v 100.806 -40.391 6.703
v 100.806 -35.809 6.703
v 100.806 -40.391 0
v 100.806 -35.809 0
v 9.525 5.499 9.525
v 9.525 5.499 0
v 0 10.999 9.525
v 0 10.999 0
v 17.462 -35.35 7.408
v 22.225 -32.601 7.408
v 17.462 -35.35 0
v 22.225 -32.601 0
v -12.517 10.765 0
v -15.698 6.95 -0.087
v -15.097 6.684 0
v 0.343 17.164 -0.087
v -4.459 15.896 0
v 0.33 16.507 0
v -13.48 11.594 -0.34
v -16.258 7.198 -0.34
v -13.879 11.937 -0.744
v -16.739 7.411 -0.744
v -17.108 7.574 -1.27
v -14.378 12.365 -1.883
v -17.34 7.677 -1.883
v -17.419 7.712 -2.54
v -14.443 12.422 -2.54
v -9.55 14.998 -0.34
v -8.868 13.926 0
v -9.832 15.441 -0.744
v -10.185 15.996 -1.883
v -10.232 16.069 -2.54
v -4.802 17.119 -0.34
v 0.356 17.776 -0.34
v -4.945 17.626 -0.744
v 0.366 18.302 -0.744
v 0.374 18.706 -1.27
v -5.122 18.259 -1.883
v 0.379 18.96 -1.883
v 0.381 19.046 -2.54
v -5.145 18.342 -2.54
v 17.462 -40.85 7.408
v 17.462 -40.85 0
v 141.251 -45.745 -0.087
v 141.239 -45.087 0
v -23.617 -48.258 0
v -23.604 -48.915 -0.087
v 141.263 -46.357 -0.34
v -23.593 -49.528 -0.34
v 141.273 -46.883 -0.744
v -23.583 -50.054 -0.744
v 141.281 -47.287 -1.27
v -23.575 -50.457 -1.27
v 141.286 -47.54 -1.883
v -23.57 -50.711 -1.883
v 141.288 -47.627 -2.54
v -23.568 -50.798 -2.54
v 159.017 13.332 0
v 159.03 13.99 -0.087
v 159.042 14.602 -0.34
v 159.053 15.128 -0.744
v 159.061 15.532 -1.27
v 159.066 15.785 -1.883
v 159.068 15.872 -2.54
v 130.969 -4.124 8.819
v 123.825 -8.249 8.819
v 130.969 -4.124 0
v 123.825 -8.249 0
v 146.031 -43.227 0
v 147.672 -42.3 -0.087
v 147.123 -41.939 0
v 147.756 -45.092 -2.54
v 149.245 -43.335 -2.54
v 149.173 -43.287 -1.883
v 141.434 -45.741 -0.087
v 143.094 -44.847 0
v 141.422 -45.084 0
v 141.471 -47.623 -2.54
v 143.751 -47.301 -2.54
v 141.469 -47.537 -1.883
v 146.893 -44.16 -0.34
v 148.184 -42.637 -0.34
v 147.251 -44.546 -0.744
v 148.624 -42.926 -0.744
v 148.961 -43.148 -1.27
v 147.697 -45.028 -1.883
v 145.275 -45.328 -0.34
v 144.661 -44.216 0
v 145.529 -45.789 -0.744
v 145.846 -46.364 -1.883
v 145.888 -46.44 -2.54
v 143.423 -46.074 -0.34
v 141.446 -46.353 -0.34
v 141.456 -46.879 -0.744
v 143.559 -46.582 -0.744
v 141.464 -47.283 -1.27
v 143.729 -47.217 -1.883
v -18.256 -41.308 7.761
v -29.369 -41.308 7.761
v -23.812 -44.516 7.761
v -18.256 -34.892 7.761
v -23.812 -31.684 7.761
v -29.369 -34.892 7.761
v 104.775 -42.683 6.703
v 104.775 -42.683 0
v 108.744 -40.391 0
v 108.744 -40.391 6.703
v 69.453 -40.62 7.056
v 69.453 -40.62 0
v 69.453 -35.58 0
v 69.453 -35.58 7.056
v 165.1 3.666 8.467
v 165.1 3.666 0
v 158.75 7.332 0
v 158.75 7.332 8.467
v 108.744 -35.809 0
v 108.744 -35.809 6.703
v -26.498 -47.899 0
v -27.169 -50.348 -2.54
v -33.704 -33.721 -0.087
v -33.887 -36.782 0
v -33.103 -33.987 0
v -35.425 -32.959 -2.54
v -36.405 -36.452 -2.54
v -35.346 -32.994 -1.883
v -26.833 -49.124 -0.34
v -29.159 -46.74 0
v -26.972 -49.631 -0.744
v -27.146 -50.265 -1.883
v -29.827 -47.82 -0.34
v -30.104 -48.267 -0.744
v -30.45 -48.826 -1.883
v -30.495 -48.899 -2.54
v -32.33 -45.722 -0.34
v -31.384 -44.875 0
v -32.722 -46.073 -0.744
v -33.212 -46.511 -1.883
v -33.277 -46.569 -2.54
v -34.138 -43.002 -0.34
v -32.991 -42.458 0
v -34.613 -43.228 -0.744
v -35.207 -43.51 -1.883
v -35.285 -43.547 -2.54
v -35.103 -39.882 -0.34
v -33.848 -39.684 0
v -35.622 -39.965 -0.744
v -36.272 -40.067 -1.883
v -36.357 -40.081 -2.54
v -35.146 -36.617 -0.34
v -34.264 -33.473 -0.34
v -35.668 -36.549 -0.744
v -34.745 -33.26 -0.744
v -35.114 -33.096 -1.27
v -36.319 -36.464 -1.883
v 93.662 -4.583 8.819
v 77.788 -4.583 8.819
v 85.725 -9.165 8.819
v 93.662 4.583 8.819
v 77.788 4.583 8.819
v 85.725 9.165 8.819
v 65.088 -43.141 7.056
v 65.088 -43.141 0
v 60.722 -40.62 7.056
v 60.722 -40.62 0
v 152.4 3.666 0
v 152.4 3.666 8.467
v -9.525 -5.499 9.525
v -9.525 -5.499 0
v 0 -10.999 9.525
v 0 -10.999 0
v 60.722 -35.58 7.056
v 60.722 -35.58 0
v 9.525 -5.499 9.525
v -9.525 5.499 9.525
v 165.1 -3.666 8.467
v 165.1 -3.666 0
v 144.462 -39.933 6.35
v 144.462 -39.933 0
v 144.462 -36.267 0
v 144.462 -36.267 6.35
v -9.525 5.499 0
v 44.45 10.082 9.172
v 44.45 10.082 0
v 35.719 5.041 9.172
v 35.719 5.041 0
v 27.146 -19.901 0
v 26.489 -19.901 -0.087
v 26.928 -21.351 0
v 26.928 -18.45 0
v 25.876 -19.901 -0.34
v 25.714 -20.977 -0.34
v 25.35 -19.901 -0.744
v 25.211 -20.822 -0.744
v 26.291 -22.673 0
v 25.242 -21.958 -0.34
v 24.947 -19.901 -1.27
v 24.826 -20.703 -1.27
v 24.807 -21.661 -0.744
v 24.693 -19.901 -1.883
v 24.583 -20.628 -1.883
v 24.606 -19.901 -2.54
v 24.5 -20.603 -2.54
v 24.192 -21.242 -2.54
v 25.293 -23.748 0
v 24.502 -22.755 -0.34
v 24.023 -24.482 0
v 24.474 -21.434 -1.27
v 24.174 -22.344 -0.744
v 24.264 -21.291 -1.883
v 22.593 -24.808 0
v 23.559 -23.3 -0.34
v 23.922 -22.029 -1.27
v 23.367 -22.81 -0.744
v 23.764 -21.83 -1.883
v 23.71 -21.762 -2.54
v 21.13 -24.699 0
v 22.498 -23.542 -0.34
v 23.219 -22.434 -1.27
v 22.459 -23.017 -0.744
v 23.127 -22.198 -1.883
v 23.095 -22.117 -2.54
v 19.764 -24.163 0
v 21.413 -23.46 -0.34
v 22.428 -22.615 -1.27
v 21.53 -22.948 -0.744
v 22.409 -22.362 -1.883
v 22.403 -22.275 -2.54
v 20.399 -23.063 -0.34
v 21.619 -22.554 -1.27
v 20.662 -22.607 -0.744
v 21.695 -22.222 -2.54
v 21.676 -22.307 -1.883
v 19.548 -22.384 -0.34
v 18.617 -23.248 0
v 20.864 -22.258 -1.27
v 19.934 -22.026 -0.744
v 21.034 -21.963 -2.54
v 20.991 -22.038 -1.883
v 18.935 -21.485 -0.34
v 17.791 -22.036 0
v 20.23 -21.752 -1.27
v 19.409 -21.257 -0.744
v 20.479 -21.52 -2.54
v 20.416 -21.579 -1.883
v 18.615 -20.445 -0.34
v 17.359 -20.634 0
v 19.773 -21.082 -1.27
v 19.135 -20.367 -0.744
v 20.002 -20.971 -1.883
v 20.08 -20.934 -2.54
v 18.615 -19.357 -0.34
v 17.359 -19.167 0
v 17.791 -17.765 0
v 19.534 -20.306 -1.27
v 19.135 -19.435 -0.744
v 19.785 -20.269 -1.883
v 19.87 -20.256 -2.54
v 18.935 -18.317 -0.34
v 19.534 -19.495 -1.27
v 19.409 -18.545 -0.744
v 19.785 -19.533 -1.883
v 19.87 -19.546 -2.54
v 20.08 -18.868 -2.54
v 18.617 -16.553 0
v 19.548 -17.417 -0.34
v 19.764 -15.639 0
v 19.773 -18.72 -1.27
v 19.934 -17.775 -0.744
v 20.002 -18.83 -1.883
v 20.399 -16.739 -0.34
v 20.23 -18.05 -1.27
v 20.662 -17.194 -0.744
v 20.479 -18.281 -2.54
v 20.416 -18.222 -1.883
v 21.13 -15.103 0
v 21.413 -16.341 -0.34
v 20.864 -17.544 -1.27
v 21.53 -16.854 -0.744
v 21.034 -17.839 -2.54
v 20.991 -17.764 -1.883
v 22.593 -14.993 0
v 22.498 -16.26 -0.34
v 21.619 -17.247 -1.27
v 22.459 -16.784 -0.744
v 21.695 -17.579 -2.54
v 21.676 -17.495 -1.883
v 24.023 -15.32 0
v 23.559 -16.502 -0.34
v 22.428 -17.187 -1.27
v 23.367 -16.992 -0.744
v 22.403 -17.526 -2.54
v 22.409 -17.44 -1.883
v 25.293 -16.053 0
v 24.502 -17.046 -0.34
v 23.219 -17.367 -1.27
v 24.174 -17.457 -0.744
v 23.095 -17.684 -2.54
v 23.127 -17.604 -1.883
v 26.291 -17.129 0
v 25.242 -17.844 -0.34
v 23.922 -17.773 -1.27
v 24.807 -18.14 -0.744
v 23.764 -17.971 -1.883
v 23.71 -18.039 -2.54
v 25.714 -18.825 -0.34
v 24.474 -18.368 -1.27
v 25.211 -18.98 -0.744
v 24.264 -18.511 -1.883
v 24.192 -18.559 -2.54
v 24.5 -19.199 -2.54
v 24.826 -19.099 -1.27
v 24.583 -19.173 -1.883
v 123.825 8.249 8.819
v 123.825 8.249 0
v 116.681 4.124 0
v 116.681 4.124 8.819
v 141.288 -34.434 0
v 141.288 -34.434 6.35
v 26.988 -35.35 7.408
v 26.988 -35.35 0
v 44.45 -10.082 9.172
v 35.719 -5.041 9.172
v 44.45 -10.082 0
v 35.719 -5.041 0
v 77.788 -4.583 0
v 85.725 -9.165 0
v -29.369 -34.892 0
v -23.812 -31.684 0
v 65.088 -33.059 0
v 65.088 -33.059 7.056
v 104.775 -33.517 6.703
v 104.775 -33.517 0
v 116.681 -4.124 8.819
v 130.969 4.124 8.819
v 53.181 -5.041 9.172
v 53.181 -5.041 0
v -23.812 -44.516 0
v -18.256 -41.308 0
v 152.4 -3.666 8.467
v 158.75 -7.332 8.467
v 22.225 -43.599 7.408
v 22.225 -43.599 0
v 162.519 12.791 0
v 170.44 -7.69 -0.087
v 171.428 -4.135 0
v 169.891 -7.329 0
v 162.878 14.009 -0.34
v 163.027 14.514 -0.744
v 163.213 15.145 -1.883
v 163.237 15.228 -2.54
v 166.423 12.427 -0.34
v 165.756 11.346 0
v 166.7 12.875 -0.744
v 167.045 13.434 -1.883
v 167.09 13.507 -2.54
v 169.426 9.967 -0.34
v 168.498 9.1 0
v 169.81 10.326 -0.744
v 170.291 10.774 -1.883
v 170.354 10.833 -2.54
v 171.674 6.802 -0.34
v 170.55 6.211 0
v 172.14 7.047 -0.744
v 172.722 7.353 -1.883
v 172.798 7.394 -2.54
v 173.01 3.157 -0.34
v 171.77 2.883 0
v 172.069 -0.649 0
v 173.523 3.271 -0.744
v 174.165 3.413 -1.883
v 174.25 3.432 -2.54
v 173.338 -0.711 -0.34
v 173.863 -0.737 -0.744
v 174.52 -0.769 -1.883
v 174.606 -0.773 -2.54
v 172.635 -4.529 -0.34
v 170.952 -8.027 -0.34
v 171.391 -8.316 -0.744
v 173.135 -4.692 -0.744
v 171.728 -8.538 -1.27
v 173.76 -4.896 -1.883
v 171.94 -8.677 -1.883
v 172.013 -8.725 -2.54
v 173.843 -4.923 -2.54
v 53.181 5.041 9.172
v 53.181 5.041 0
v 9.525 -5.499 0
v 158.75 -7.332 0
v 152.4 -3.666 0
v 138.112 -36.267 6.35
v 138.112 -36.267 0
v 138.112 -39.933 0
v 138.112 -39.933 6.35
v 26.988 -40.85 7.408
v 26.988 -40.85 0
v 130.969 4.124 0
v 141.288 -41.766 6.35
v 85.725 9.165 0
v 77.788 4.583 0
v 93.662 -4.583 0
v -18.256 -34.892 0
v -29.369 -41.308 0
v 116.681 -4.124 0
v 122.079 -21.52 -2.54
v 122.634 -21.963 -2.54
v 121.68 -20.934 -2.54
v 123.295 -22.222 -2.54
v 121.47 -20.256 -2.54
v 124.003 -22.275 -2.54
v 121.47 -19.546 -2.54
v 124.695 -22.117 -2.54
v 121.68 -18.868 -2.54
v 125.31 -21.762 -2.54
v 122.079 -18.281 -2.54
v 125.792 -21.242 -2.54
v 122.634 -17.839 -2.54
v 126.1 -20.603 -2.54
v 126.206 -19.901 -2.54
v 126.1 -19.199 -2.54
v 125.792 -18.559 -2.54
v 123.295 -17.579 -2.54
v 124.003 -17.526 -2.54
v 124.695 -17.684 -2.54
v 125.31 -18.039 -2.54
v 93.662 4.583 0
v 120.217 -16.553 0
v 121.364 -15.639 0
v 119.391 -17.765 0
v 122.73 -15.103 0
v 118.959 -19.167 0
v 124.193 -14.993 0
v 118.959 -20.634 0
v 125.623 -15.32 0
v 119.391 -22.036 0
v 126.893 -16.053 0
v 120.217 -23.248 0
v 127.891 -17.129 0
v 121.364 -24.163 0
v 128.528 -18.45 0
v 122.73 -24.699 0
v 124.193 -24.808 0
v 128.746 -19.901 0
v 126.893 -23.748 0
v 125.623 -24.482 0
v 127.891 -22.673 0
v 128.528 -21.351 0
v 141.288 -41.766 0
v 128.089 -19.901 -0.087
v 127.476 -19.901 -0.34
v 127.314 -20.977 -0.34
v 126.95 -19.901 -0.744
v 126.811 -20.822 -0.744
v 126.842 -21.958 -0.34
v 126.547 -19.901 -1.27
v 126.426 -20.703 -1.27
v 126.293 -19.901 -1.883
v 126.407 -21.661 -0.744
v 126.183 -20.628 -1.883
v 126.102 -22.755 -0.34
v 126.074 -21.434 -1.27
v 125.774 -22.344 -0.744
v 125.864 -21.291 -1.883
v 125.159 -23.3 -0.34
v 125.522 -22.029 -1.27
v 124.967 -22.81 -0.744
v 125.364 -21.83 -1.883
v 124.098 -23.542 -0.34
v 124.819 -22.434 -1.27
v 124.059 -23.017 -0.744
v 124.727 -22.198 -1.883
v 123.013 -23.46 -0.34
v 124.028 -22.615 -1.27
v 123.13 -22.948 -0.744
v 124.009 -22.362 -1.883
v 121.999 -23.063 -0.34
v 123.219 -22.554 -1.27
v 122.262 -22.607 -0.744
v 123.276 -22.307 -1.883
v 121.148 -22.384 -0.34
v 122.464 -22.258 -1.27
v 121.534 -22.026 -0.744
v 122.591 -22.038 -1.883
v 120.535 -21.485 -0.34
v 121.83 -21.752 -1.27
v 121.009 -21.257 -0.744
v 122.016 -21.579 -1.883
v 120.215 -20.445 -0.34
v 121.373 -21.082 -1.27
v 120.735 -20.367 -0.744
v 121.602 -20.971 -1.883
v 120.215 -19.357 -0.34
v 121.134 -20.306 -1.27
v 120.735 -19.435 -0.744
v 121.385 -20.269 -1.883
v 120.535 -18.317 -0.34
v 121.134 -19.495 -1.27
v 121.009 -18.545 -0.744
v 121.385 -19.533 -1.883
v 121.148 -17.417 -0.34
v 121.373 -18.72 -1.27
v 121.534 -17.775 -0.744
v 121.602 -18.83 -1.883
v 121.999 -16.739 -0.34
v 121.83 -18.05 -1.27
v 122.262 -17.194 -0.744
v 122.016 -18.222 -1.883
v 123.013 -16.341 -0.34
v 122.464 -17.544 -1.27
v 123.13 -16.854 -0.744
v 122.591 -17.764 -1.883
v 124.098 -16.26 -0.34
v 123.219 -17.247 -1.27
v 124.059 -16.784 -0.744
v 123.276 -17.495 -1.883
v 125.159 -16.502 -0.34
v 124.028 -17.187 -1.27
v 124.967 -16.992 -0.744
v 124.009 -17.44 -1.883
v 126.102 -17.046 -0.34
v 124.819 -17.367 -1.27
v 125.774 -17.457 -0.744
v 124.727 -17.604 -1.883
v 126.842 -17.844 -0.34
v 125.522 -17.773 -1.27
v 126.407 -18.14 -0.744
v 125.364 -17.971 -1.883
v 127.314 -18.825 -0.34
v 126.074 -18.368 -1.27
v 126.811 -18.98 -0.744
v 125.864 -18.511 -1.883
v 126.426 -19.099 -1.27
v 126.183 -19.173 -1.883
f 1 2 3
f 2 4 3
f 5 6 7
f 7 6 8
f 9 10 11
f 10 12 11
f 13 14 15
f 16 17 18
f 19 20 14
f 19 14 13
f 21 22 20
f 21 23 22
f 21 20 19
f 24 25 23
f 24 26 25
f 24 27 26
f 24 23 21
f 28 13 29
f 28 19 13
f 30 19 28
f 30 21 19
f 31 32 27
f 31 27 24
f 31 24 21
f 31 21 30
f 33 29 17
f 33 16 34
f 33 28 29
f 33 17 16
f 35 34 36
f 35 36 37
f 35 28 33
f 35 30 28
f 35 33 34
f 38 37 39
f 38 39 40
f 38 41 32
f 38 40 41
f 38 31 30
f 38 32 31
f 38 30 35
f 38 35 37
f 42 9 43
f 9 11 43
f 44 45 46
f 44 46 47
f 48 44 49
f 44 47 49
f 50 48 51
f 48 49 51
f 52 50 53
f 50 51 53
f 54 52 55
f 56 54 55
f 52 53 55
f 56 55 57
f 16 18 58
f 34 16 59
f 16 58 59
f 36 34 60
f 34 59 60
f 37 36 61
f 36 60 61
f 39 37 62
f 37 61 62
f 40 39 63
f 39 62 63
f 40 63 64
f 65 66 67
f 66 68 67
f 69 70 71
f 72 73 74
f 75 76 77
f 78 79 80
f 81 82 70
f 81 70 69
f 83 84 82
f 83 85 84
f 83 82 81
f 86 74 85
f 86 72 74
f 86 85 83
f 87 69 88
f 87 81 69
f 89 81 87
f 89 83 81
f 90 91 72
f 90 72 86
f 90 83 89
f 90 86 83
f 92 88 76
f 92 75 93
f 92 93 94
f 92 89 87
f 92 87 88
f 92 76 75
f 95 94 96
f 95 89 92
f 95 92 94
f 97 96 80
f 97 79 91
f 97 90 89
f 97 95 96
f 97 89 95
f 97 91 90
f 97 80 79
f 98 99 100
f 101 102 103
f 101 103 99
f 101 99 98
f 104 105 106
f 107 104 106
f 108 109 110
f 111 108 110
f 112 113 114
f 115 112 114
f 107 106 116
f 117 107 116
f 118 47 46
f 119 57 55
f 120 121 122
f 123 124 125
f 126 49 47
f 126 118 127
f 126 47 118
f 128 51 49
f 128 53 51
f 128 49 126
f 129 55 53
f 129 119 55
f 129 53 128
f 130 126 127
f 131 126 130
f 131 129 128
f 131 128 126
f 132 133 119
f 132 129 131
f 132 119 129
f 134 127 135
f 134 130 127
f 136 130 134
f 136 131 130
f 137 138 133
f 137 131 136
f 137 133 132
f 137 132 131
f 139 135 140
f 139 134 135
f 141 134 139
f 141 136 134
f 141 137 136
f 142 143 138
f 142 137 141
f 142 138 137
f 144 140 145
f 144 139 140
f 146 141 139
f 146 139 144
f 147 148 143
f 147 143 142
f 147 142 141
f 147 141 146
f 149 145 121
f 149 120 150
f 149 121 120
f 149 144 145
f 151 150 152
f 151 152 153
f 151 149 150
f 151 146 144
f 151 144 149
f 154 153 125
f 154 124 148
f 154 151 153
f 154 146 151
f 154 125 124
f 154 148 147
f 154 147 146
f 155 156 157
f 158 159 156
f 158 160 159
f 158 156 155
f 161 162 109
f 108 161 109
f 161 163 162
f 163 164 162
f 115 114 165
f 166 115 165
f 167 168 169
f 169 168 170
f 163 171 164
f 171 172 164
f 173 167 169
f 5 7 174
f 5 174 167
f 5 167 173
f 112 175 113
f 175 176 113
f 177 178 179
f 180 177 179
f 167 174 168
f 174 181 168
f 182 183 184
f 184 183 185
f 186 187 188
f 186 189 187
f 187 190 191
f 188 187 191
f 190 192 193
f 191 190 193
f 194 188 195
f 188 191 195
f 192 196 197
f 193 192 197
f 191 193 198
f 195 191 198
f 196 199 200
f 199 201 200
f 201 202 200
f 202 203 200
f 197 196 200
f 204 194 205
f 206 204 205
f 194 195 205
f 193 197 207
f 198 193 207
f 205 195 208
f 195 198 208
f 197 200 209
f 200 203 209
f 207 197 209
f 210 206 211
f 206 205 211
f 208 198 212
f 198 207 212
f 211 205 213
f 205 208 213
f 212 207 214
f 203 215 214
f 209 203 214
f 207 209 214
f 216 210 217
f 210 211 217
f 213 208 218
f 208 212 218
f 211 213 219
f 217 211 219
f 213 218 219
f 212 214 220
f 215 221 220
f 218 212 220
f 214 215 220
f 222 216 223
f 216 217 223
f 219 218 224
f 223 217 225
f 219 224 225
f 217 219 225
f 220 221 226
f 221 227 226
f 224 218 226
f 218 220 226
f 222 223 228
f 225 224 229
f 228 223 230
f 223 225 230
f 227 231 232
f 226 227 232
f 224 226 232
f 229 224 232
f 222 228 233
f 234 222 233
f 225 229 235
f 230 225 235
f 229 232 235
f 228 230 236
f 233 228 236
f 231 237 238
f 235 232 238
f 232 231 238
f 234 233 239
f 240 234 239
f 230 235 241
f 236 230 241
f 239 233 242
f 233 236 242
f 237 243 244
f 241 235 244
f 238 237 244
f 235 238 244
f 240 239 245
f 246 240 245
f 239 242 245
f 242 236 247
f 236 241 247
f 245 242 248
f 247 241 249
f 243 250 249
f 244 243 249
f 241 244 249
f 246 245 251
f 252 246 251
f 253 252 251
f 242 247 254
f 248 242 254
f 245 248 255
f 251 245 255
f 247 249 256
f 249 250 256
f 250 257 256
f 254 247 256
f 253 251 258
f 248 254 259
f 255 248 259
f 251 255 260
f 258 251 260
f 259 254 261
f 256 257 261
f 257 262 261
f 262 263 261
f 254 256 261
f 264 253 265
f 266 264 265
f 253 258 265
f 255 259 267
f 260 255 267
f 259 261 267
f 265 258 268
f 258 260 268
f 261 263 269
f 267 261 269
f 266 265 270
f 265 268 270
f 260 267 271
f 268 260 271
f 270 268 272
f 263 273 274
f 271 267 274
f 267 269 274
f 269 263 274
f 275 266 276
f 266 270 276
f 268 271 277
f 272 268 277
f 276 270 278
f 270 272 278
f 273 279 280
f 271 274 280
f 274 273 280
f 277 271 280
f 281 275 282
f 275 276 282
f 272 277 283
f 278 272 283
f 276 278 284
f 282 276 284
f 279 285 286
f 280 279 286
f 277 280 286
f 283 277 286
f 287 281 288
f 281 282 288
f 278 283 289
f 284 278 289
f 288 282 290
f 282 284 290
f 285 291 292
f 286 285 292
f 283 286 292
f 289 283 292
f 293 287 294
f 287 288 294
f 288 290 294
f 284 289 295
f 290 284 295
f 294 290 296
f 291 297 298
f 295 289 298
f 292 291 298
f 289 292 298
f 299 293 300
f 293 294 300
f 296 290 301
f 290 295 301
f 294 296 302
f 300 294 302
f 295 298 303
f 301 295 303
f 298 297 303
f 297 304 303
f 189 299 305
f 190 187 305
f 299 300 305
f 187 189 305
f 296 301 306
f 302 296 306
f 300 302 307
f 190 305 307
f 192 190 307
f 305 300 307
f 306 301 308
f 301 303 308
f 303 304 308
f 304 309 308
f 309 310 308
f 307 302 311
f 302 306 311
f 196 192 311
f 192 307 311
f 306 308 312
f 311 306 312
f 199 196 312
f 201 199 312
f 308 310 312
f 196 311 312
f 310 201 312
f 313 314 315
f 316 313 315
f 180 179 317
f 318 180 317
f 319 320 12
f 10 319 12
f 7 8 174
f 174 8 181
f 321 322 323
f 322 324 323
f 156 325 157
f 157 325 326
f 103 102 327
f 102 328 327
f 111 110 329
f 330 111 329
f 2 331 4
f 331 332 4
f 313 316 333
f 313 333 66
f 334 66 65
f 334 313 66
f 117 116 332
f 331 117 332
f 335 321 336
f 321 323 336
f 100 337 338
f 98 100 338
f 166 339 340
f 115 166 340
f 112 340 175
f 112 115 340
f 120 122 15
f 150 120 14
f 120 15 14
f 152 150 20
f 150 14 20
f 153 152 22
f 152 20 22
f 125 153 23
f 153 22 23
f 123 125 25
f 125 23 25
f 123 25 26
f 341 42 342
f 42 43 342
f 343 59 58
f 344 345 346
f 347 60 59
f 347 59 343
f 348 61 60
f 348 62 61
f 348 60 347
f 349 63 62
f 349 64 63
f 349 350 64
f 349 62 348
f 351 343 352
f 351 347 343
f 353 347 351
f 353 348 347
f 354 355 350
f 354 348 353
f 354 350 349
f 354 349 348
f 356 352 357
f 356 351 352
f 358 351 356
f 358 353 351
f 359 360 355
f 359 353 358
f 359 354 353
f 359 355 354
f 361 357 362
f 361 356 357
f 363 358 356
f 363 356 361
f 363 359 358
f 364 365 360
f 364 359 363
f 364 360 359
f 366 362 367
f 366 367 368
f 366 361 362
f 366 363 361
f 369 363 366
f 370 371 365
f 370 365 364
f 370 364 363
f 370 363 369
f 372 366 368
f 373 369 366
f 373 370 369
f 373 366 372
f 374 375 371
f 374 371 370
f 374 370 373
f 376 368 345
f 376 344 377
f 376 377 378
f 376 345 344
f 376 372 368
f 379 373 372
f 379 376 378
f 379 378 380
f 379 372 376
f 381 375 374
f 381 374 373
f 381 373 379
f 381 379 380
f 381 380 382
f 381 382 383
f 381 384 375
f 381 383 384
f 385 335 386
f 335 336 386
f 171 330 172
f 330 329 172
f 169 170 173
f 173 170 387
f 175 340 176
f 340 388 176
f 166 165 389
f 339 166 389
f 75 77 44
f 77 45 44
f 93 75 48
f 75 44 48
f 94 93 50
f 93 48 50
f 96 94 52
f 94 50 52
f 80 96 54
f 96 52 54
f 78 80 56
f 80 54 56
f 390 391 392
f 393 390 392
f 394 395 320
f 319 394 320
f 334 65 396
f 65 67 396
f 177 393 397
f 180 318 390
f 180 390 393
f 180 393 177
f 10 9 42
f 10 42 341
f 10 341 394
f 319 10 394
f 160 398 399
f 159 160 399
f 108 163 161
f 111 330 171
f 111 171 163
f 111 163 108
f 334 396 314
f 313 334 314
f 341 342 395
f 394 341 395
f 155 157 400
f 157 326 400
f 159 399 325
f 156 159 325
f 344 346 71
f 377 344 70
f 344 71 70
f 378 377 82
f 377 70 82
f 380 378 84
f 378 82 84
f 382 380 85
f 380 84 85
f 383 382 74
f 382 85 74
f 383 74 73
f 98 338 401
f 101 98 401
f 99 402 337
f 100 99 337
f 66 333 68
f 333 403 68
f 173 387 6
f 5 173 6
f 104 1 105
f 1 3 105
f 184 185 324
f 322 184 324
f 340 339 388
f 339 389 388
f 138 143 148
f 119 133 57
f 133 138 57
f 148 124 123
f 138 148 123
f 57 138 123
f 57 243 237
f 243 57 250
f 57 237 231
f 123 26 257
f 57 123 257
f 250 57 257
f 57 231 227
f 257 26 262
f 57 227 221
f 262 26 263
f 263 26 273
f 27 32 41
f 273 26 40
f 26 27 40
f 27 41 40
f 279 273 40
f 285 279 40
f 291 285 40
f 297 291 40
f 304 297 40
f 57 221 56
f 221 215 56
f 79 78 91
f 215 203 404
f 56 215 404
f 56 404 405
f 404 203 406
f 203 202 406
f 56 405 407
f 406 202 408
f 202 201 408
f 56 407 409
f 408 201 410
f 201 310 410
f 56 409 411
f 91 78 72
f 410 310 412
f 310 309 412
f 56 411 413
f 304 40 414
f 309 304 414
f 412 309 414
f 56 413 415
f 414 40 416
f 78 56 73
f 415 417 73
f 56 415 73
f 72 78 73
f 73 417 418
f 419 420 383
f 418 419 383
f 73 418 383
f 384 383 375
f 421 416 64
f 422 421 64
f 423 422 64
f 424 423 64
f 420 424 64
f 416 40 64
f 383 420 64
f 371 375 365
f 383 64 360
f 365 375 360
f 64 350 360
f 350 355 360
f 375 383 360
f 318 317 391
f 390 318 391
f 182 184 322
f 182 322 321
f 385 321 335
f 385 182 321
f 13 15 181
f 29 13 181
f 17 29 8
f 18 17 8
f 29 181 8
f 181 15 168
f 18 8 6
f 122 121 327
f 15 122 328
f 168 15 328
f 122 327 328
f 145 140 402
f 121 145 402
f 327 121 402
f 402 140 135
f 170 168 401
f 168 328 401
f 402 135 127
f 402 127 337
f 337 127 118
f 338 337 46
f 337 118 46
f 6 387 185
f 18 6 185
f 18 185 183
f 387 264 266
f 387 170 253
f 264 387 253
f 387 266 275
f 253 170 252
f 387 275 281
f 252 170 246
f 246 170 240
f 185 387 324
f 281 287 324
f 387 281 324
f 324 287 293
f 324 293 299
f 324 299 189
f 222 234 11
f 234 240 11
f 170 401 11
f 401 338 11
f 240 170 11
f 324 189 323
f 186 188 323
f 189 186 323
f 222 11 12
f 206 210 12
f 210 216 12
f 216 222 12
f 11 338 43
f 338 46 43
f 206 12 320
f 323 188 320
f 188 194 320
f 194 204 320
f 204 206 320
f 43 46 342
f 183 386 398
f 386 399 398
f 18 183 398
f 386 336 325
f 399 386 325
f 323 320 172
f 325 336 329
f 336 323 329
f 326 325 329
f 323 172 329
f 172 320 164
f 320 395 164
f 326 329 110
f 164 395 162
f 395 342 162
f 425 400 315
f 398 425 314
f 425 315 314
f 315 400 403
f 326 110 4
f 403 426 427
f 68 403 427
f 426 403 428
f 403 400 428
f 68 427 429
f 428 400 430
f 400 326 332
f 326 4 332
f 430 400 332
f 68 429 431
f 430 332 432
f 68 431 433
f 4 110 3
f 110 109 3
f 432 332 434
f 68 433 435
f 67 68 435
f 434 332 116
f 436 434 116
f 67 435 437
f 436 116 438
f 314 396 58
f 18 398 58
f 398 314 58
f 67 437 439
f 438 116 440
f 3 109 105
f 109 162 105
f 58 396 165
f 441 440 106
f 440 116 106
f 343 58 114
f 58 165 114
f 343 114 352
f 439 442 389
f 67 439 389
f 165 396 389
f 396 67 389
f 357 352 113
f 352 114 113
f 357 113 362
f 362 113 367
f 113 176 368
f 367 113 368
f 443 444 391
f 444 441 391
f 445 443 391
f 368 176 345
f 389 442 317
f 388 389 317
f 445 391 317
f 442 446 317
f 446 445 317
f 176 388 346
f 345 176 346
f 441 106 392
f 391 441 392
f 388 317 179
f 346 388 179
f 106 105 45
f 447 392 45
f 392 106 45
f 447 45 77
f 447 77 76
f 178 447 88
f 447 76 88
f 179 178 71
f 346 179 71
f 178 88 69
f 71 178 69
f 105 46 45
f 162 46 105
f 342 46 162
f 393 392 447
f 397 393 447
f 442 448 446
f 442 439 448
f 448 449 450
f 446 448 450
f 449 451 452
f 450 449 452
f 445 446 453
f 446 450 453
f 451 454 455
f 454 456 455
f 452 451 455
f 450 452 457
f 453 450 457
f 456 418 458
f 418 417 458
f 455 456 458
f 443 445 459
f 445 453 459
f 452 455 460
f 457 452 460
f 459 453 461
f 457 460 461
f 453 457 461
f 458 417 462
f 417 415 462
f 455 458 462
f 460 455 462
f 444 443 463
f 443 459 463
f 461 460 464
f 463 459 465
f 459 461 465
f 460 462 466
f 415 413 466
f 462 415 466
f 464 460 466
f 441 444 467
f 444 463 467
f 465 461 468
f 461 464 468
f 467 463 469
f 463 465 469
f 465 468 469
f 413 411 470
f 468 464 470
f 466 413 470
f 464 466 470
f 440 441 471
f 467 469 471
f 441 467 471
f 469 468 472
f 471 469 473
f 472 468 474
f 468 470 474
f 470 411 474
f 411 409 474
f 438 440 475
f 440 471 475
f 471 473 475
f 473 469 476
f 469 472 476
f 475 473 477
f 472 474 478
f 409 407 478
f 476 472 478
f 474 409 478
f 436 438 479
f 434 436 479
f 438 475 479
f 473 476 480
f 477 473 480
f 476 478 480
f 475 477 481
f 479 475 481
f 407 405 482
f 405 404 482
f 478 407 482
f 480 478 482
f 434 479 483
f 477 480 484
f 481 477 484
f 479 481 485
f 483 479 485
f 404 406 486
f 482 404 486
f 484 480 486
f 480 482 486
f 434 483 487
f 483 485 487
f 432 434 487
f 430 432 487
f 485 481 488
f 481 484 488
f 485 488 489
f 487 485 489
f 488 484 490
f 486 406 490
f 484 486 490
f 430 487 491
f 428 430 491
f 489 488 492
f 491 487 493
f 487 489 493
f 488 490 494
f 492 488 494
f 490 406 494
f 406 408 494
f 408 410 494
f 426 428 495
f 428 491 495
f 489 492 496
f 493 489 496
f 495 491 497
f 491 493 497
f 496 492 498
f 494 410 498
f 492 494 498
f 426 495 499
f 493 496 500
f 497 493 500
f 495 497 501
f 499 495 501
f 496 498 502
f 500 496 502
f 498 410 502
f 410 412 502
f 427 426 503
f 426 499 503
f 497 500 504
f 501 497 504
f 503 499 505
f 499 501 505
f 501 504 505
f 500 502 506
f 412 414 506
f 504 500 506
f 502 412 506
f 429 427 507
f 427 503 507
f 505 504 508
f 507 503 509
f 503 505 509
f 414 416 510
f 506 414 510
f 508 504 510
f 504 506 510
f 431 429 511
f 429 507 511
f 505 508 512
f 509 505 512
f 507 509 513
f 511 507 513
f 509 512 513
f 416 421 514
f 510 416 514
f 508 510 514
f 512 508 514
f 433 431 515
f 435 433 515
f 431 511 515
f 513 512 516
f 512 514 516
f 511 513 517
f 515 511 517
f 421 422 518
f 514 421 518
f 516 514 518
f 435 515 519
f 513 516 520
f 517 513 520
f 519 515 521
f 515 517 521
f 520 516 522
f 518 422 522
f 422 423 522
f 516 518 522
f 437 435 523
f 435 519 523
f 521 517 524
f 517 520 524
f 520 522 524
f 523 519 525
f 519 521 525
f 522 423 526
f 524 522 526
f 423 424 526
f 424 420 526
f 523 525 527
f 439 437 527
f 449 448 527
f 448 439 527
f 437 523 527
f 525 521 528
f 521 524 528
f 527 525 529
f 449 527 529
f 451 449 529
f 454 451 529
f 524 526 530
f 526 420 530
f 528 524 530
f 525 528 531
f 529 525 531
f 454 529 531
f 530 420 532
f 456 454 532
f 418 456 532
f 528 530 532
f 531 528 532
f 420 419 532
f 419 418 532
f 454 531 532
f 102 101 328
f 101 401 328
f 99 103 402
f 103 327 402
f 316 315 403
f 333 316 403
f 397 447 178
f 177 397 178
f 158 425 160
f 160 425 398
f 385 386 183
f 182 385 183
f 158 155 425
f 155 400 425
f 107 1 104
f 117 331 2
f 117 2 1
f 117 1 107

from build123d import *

# Parameters (mm, degrees)
F1_DEPTH  = 6.35
F2_DEPTH  = 3.175
F3_DEPTH  = 2.8222222222
F4_DEPTH  = 2.4694444444
F5_DEPTH  = 2.4694444444
F6_DEPTH  = 2.1166666667
F7_DEPTH  = 1.4111111111
F8_DEPTH  = 1.0583333333
F9_DEPTH  = 0.3527777778
F10_DEPTH = 0.7055555556
F12_DEPTH = 2.54
F13_R     = 2.38125
F14_DEPTH = 25.4
F15_R     = 2.53999
F16_R     = 2.53999
F18_DEPTH = 2.54


# Not quite as in the source:
# - a fillet or chamfer is up to 0.001 mm smaller than in the source, because OpenCascade refuses the exact size


with BuildPart() as f1:
    # F0 (on Top) → F1 (new body)
    with BuildSketch(Plane.XY):
        Polygon((152.4, 3.6661742094), (152.4, 0), (152.4, -3.6661742094), (158.75, -7.3323484187), (165.1, -3.6661742094), (165.1, 3.6661742094), (158.75, 7.3323484187), align=None)
    extrude(amount=F1_DEPTH)

    # F6 (add): a face of the model
    f6_faces = [f1.faces().sort_by_distance(p)[0] for p in [
        (158.75, 0, 6.35),
    ]]
    extrude(f6_faces, amount=F6_DEPTH)


with BuildPart() as f1b:
    # F0 (on Top) → F1, piece 2 (new body)
    with BuildSketch(Plane.XY):
        Polygon((144.4625, -36.2669128953), (141.2875, -34.4338257906), (138.1125, -36.2669128953), (138.1125, -39.9330871047), (141.2875, -41.7661742094), (144.4625, -39.9330871047), align=None)
    extrude(amount=F1_DEPTH)


with BuildPart() as f1c:
    # F0 (on Top) → F1, piece 3 (new body)
    with BuildSketch(Plane.XY):
        Polygon((116.68125, 4.1244459855), (116.68125, 0), (123.825, 0), (130.96875, 0), (130.96875, 4.1244459855), (123.825, 8.248891971), align=None)
        Polygon((123.825, 0), (116.68125, 0), (116.68125, -4.1244459855), (123.825, -8.248891971), (130.96875, -4.1244459855), (130.96875, 0), align=None)
    extrude(amount=F1_DEPTH)

    # F5 (add): a face of the model
    f5_faces = [f1c.faces().sort_by_distance(p)[0] for p in [
        (123.825, 0, 6.35),
    ]]
    extrude(f5_faces, amount=F5_DEPTH)


with BuildPart() as f1d:
    # F0 (on Top) → F1, piece 4 (new body)
    with BuildSketch(Plane.XY):
        Polygon((108.74375, -35.8086411192), (104.775, -33.5172822383), (100.80625, -35.8086411192), (100.80625, -40.3913588808), (104.775, -42.6827177617), (108.74375, -40.3913588808), align=None)
    extrude(amount=F1_DEPTH)

    # F9 (add): a face of the model
    f9_faces = [f1d.faces().sort_by_distance(p)[0] for p in [
        (104.775, -38.1, 6.35),
    ]]
    extrude(f9_faces, amount=F9_DEPTH)


with BuildPart() as f1e:
    # F0 (on Top) → F1, piece 5 (new body)
    with BuildSketch(Plane.XY):
        Polygon((77.7875, 4.5827177617), (77.7875, 0), (85.725, 0), (93.6625, 0), (93.6625, 4.5827177617), (85.725, 9.1654355234), align=None)
        Polygon((85.725, 0), (77.7875, 0), (77.7875, -4.5827177617), (85.725, -9.1654355234), (93.6625, -4.5827177617), (93.6625, 0), align=None)
    extrude(amount=F1_DEPTH)

    # F4 (add): a face of the model
    f4_faces = [f1e.faces().sort_by_distance(p)[0] for p in [
        (85.725, 0, 6.35),
    ]]
    extrude(f4_faces, amount=F4_DEPTH)


with BuildPart() as f1f:
    # F0 (on Top) → F1, piece 6 (new body)
    with BuildSketch(Plane.XY):
        Polygon((69.453125, -35.5795052311), (65.0875, -33.0590104621), (60.721875, -35.5795052311), (60.721875, -40.6204947689), (65.0875, -43.1409895379), (69.453125, -40.6204947689), align=None)
    extrude(amount=F1_DEPTH)

    # F10 (add): a face of the model
    f10_faces = [f1f.faces().sort_by_distance(p)[0] for p in [
        (65.0875, -38.1, 6.35),
    ]]
    extrude(f10_faces, amount=F10_DEPTH)


with BuildPart() as f1g:
    # F0 (on Top) → F1, piece 7 (new body)
    with BuildSketch(Plane.XY):
        Polygon((35.71875, 5.0409895379), (35.71875, 0), (44.45, 0), (53.18125, 0), (53.18125, 5.0409895379), (44.45, 10.0819790757), align=None)
        Polygon((44.45, 0), (35.71875, 0), (35.71875, -5.0409895379), (44.45, -10.0819790757), (53.18125, -5.0409895379), (53.18125, 0), align=None)
    extrude(amount=F1_DEPTH)

    # F3 (add): a face of the model
    f3_faces = [f1g.faces().sort_by_distance(p)[0] for p in [
        (44.45, 0, 6.35),
    ]]
    extrude(f3_faces, amount=F3_DEPTH)


with BuildPart() as f1h:
    # F0 (on Top) → F1, piece 8 (new body)
    with BuildSketch(Plane.XY):
        Polygon((-18.25625, -41.3079024332), (-18.25625, -38.1), (-18.25625, -34.8920975668), (-23.8125, -31.6841951336), (-29.36875, -34.8920975668), (-29.36875, -41.3079024332), (-23.8125, -44.5158048664), align=None)
    extrude(amount=F1_DEPTH)

    # F7 (add): a face of the model
    f7_faces = [f1h.faces().sort_by_distance(p)[0] for p in [
        (-23.8125, -38.1, 6.35),
    ]]
    extrude(f7_faces, amount=F7_DEPTH)


with BuildPart() as f1i:
    # F0 (on Top) → F1, piece 9 (new body)
    with BuildSketch(Plane.XY):
        Polygon((26.9875, -35.350369343), (22.225, -32.600738686), (22.225, -38.1), (17.4625, -38.1), (17.4625, -40.849630657), (22.225, -43.599261314), (26.9875, -40.849630657), align=None)
        Polygon((22.225, -38.1), (22.225, -32.600738686), (17.4625, -35.350369343), (17.4625, -38.1), align=None)
    extrude(amount=F1_DEPTH)

    # F8 (add): a face of the model
    f8_faces = [f1i.faces().sort_by_distance(p)[0] for p in [
        (22.225, -38.1, 6.35),
    ]]
    extrude(f8_faces, amount=F8_DEPTH)


with BuildPart() as f1j:
    # F0 (on Top) → F1, piece 10 (new body)
    with BuildSketch(Plane.XY):
        Polygon((9.525, -5.499261314), (9.525, 0), (9.525, 5.499261314), (0, 10.9985226281), (-9.525, 5.499261314), (-9.525, -5.499261314), (0, -10.9985226281), align=None)
    extrude(amount=F1_DEPTH)

    # F2 (add): a face of the model
    f2_faces = [f1j.faces().sort_by_distance(p)[0] for p in [
        (0, 0, 6.35),
    ]]
    extrude(f2_faces, amount=F2_DEPTH)


with BuildPart() as f12:
    # F11 (on face) → F12 (new body)
    with BuildSketch(Plane(origin=(0, 0, 0), x_dir=(1, 0, 0), z_dir=(0, 0, -1))):
        with BuildLine():
            Line((141.2875, 47.6267617683), (-23.5682692308, 50.7976514101))
            ThreePointArc((-23.5682692308, 50.7976514101), (-14.7463064556, 46.9934883266), (-11.1125, 38.1))
            Line((-11.1125, 38.1), (131.7625, 38.1))
            ThreePointArc((131.7625, 38.1), (134.617383755, 44.8996451583), (141.4706730769, 47.6232385575))
            Line((141.4706730769, 47.6232385575), (141.2875, 47.6267617683))
        make_face()
        with BuildLine():
            Line((-35.4252854215, 32.9586757782), (-17.4191781323, -7.7119863327))
            ThreePointArc((-17.4191781323, -7.7119863327), (-10.2318580693, -16.0689632662), (0.381, -19.0461896189))
            ThreePointArc((0.381, -19.0461896189), (13.6044211564, -13.335), (19.05, 0))
            Line((19.05, 0), (142.875, 0))
            ThreePointArc((142.875, 0), (147.6375, -11.3370176303), (159.0675, -15.8718246824))
            ThreePointArc((159.0675, -15.8718246824), (172.7981495603, -7.3935863375), (172.0126501051, 8.7245479648))
            Line((172.0126501051, 8.7245479648), (149.245090063, 43.3347287789))
            ThreePointArc((149.245090063, 43.3347287789), (145.8881342123, 46.4402511859), (141.4706730769, 47.6232385575))
            ThreePointArc((141.4706730769, 47.6232385575), (134.617383755, 44.8996451583), (131.7625, 38.1))
            Line((131.7625, 38.1), (-11.1125, 38.1))
            ThreePointArc((-11.1125, 38.1), (-14.7463064556, 46.9934883266), (-23.5682692308, 50.7976514101))
            ThreePointArc((-23.5682692308, 50.7976514101), (-34.3892798322, 45.1300589173), (-35.4252854215, 32.9586757782))
        make_face()
        Polygon((9.525, 5.499261314), (9.525, 0), (9.525, -5.499261314), (0, -10.9985226281), (-9.525, -5.499261314), (-9.525, 5.499261314), (0, 10.9985226281), align=None, mode=Mode.SUBTRACT)
        with BuildLine():
            ThreePointArc((19.05, 0), (13.6044211564, -13.335), (0.381, -19.0461896189))
            Line((0.381, -19.0461896189), (159.0675, -15.8718246824))
            ThreePointArc((159.0675, -15.8718246824), (147.6375, -11.3370176303), (142.875, 0))
            Line((142.875, 0), (19.05, 0))
        make_face()
    extrude(amount=F12_DEPTH)

    # F13 (on face) → F14 (cut)
    with BuildSketch(Plane(origin=(0, 0, -2.54), x_dir=(1, 0, 0), z_dir=(0, 0, -1))):
        with Locations((22.225, 19.900738686)):
            Circle(F13_R)
        with Locations((123.825, 19.900738686)):
            Circle(F13_R)
    extrude(amount=-F14_DEPTH, mode=Mode.SUBTRACT)

    # F15 (radius 2.54 in the source; OpenCascade refuses exactly that, so slightly less here)
    f15_edges = [f12.edges().sort_by_distance(p)[0] for p in [
        (19.84375, -19.900739, 0),
    ]]
    fillet(f15_edges, radius=F15_R)

    # F16 (radius 2.54 in the source; OpenCascade refuses exactly that, so slightly less here)
    f16_edges = [f12.edges().sort_by_distance(p)[0] for p in [
        (58.951202, -49.210445, 0),
        (121.44375, -19.900739, 0),
    ]]
    fillet(f16_edges, radius=F16_R)


with BuildPart() as f1j_1:
    add(f1j.part)

    # F17: union F1g, F1e, F1c, F1, F1h, F1i, F1f, F1d, F1b, F12
    add(f1g.part)
    add(f1e.part)
    add(f1c.part)
    add(f1.part)
    add(f1h.part)
    add(f1i.part)
    add(f1f.part)
    add(f1d.part)
    add(f1b.part)
    add(f12.part)

    # F18 (add, through all): a face of the model
    f18_faces = [f1j_1.faces().sort_by_distance(p)[0] for p in [
        (0, 0, 0),
    ]]
    extrude(f18_faces, amount=F18_DEPTH)


solid = f1j_1.part
